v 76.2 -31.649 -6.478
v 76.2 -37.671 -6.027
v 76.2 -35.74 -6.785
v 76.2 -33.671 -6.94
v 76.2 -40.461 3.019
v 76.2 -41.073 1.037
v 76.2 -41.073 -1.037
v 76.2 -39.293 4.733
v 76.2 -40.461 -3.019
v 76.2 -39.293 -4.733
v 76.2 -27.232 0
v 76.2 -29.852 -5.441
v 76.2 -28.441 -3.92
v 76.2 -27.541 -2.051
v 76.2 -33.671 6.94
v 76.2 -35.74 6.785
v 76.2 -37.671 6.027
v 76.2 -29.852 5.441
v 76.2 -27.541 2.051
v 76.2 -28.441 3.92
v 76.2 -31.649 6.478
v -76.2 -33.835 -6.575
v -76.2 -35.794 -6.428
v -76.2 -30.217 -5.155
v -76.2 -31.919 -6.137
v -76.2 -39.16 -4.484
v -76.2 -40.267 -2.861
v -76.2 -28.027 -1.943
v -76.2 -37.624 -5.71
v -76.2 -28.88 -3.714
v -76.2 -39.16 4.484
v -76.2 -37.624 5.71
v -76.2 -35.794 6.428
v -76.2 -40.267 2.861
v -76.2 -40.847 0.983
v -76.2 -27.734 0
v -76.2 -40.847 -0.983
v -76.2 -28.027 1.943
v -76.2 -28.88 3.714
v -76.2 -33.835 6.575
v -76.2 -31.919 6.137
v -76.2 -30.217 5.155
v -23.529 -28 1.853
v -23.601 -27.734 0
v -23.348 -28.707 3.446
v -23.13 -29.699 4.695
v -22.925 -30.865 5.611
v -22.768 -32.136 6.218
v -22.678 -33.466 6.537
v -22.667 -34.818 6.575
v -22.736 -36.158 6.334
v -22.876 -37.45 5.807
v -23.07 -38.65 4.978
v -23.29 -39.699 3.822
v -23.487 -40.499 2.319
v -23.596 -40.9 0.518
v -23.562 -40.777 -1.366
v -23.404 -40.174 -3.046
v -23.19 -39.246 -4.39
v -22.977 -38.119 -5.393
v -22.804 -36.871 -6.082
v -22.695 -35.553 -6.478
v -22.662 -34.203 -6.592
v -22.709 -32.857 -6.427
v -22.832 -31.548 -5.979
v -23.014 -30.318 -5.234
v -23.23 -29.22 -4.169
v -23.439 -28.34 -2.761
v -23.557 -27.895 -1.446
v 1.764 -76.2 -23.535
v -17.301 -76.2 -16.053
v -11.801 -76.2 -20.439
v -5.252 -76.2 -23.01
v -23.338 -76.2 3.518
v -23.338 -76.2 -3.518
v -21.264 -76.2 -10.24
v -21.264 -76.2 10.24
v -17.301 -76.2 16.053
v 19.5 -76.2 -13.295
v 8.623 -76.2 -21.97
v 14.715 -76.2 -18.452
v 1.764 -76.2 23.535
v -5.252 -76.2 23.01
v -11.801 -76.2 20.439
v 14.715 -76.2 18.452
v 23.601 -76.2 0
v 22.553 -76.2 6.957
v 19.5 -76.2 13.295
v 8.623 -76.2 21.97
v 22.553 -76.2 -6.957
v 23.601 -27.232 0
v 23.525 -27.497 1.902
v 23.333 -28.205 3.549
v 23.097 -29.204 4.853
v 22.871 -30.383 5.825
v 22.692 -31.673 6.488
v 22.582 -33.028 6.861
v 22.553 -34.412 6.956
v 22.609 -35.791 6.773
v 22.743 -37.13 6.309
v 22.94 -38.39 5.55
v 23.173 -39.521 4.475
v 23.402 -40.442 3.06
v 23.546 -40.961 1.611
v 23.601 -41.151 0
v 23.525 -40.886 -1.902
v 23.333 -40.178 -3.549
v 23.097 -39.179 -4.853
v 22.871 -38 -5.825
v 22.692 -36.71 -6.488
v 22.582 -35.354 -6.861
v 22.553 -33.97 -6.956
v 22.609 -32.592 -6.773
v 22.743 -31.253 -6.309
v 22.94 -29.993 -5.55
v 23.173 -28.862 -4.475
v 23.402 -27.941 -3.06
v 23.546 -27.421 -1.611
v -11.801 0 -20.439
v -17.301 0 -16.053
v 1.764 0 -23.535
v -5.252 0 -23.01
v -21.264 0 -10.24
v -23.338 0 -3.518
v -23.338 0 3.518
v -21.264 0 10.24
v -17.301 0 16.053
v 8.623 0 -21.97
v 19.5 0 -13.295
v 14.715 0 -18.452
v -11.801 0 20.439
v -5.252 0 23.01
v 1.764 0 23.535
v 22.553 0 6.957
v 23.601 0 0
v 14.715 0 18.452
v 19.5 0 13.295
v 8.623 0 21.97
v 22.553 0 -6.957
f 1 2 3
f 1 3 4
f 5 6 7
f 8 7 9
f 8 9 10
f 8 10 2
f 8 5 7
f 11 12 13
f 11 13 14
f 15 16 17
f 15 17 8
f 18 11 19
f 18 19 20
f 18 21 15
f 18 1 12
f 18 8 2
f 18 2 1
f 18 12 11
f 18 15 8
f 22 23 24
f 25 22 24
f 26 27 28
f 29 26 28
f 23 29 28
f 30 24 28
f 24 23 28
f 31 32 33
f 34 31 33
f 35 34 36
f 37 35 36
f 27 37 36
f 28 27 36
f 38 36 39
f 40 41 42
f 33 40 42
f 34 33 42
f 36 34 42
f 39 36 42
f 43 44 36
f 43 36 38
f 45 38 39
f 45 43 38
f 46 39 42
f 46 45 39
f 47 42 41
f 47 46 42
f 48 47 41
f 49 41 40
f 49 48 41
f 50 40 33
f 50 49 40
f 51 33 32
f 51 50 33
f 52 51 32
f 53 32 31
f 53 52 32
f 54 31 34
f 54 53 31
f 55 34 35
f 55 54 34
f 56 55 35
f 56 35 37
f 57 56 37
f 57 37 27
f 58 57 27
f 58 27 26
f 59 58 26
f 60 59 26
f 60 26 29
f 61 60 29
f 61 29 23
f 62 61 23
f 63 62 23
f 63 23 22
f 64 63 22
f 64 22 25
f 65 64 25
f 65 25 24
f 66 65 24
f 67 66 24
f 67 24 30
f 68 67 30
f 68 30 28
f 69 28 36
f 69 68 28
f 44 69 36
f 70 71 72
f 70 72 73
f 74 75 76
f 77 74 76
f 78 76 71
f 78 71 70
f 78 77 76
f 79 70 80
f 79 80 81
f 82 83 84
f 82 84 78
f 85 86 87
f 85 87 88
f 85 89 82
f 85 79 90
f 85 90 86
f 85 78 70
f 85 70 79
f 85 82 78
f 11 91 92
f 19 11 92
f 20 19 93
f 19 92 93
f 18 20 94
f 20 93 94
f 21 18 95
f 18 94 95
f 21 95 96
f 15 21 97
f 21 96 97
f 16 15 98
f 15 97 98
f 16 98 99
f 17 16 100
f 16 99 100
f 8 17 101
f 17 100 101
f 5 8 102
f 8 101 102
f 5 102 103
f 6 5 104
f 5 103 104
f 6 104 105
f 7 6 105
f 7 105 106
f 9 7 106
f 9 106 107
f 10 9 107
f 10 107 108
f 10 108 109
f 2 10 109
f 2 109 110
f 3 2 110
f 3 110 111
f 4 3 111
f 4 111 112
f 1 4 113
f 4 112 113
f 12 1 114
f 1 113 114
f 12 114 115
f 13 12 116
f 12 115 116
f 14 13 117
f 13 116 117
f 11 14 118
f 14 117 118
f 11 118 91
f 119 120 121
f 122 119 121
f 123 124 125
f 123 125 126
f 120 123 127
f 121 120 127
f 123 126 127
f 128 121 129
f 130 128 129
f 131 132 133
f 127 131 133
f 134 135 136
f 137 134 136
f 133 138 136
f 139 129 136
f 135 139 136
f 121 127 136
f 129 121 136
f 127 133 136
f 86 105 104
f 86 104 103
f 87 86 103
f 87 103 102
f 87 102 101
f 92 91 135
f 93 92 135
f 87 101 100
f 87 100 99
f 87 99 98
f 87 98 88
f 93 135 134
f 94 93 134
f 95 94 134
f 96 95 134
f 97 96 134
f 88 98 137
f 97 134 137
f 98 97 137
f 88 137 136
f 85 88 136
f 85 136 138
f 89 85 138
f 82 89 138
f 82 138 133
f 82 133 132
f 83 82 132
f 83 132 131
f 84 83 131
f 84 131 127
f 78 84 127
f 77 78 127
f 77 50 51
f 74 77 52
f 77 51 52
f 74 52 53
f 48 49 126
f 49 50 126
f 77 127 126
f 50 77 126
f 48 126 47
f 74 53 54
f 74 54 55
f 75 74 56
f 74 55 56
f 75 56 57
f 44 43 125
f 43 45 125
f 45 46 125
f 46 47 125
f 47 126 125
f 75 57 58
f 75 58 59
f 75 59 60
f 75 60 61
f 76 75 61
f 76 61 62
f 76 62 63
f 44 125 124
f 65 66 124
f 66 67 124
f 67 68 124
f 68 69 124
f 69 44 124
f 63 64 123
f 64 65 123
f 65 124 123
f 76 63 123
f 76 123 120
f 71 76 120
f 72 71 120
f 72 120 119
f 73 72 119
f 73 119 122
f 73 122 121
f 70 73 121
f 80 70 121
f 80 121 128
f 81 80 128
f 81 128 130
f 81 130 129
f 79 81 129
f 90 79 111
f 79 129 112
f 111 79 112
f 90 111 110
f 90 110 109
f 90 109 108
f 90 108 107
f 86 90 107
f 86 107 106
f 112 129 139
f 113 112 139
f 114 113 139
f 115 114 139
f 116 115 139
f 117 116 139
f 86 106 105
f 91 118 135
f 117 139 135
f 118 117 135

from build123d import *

# Parameters (mm, degrees)
F0_R     = 23.601402
F1_DEPTH = 76.2
F2_R     = 6.959229
F3_DEPTH = 76.2
F4_R     = 6.59301
F5_DEPTH = 76.2


with BuildPart() as f1:
    # F0 (on Front) → F1 (new body)
    with BuildSketch(Plane.XZ):
        Circle(F0_R)
    extrude(amount=F1_DEPTH)

    # F2 (on Right) → F3 (join)
    with BuildSketch(Plane.YZ):
        with Locations((-34.191292, 0)):
            Circle(F2_R)
    extrude(amount=F3_DEPTH)

    # F4 (on Right) → F5 (join)
    with BuildSketch(Plane.YZ):
        with Locations((-34.327276, 0)):
            Circle(F4_R)
    extrude(amount=-F5_DEPTH)


solid = f1.part
